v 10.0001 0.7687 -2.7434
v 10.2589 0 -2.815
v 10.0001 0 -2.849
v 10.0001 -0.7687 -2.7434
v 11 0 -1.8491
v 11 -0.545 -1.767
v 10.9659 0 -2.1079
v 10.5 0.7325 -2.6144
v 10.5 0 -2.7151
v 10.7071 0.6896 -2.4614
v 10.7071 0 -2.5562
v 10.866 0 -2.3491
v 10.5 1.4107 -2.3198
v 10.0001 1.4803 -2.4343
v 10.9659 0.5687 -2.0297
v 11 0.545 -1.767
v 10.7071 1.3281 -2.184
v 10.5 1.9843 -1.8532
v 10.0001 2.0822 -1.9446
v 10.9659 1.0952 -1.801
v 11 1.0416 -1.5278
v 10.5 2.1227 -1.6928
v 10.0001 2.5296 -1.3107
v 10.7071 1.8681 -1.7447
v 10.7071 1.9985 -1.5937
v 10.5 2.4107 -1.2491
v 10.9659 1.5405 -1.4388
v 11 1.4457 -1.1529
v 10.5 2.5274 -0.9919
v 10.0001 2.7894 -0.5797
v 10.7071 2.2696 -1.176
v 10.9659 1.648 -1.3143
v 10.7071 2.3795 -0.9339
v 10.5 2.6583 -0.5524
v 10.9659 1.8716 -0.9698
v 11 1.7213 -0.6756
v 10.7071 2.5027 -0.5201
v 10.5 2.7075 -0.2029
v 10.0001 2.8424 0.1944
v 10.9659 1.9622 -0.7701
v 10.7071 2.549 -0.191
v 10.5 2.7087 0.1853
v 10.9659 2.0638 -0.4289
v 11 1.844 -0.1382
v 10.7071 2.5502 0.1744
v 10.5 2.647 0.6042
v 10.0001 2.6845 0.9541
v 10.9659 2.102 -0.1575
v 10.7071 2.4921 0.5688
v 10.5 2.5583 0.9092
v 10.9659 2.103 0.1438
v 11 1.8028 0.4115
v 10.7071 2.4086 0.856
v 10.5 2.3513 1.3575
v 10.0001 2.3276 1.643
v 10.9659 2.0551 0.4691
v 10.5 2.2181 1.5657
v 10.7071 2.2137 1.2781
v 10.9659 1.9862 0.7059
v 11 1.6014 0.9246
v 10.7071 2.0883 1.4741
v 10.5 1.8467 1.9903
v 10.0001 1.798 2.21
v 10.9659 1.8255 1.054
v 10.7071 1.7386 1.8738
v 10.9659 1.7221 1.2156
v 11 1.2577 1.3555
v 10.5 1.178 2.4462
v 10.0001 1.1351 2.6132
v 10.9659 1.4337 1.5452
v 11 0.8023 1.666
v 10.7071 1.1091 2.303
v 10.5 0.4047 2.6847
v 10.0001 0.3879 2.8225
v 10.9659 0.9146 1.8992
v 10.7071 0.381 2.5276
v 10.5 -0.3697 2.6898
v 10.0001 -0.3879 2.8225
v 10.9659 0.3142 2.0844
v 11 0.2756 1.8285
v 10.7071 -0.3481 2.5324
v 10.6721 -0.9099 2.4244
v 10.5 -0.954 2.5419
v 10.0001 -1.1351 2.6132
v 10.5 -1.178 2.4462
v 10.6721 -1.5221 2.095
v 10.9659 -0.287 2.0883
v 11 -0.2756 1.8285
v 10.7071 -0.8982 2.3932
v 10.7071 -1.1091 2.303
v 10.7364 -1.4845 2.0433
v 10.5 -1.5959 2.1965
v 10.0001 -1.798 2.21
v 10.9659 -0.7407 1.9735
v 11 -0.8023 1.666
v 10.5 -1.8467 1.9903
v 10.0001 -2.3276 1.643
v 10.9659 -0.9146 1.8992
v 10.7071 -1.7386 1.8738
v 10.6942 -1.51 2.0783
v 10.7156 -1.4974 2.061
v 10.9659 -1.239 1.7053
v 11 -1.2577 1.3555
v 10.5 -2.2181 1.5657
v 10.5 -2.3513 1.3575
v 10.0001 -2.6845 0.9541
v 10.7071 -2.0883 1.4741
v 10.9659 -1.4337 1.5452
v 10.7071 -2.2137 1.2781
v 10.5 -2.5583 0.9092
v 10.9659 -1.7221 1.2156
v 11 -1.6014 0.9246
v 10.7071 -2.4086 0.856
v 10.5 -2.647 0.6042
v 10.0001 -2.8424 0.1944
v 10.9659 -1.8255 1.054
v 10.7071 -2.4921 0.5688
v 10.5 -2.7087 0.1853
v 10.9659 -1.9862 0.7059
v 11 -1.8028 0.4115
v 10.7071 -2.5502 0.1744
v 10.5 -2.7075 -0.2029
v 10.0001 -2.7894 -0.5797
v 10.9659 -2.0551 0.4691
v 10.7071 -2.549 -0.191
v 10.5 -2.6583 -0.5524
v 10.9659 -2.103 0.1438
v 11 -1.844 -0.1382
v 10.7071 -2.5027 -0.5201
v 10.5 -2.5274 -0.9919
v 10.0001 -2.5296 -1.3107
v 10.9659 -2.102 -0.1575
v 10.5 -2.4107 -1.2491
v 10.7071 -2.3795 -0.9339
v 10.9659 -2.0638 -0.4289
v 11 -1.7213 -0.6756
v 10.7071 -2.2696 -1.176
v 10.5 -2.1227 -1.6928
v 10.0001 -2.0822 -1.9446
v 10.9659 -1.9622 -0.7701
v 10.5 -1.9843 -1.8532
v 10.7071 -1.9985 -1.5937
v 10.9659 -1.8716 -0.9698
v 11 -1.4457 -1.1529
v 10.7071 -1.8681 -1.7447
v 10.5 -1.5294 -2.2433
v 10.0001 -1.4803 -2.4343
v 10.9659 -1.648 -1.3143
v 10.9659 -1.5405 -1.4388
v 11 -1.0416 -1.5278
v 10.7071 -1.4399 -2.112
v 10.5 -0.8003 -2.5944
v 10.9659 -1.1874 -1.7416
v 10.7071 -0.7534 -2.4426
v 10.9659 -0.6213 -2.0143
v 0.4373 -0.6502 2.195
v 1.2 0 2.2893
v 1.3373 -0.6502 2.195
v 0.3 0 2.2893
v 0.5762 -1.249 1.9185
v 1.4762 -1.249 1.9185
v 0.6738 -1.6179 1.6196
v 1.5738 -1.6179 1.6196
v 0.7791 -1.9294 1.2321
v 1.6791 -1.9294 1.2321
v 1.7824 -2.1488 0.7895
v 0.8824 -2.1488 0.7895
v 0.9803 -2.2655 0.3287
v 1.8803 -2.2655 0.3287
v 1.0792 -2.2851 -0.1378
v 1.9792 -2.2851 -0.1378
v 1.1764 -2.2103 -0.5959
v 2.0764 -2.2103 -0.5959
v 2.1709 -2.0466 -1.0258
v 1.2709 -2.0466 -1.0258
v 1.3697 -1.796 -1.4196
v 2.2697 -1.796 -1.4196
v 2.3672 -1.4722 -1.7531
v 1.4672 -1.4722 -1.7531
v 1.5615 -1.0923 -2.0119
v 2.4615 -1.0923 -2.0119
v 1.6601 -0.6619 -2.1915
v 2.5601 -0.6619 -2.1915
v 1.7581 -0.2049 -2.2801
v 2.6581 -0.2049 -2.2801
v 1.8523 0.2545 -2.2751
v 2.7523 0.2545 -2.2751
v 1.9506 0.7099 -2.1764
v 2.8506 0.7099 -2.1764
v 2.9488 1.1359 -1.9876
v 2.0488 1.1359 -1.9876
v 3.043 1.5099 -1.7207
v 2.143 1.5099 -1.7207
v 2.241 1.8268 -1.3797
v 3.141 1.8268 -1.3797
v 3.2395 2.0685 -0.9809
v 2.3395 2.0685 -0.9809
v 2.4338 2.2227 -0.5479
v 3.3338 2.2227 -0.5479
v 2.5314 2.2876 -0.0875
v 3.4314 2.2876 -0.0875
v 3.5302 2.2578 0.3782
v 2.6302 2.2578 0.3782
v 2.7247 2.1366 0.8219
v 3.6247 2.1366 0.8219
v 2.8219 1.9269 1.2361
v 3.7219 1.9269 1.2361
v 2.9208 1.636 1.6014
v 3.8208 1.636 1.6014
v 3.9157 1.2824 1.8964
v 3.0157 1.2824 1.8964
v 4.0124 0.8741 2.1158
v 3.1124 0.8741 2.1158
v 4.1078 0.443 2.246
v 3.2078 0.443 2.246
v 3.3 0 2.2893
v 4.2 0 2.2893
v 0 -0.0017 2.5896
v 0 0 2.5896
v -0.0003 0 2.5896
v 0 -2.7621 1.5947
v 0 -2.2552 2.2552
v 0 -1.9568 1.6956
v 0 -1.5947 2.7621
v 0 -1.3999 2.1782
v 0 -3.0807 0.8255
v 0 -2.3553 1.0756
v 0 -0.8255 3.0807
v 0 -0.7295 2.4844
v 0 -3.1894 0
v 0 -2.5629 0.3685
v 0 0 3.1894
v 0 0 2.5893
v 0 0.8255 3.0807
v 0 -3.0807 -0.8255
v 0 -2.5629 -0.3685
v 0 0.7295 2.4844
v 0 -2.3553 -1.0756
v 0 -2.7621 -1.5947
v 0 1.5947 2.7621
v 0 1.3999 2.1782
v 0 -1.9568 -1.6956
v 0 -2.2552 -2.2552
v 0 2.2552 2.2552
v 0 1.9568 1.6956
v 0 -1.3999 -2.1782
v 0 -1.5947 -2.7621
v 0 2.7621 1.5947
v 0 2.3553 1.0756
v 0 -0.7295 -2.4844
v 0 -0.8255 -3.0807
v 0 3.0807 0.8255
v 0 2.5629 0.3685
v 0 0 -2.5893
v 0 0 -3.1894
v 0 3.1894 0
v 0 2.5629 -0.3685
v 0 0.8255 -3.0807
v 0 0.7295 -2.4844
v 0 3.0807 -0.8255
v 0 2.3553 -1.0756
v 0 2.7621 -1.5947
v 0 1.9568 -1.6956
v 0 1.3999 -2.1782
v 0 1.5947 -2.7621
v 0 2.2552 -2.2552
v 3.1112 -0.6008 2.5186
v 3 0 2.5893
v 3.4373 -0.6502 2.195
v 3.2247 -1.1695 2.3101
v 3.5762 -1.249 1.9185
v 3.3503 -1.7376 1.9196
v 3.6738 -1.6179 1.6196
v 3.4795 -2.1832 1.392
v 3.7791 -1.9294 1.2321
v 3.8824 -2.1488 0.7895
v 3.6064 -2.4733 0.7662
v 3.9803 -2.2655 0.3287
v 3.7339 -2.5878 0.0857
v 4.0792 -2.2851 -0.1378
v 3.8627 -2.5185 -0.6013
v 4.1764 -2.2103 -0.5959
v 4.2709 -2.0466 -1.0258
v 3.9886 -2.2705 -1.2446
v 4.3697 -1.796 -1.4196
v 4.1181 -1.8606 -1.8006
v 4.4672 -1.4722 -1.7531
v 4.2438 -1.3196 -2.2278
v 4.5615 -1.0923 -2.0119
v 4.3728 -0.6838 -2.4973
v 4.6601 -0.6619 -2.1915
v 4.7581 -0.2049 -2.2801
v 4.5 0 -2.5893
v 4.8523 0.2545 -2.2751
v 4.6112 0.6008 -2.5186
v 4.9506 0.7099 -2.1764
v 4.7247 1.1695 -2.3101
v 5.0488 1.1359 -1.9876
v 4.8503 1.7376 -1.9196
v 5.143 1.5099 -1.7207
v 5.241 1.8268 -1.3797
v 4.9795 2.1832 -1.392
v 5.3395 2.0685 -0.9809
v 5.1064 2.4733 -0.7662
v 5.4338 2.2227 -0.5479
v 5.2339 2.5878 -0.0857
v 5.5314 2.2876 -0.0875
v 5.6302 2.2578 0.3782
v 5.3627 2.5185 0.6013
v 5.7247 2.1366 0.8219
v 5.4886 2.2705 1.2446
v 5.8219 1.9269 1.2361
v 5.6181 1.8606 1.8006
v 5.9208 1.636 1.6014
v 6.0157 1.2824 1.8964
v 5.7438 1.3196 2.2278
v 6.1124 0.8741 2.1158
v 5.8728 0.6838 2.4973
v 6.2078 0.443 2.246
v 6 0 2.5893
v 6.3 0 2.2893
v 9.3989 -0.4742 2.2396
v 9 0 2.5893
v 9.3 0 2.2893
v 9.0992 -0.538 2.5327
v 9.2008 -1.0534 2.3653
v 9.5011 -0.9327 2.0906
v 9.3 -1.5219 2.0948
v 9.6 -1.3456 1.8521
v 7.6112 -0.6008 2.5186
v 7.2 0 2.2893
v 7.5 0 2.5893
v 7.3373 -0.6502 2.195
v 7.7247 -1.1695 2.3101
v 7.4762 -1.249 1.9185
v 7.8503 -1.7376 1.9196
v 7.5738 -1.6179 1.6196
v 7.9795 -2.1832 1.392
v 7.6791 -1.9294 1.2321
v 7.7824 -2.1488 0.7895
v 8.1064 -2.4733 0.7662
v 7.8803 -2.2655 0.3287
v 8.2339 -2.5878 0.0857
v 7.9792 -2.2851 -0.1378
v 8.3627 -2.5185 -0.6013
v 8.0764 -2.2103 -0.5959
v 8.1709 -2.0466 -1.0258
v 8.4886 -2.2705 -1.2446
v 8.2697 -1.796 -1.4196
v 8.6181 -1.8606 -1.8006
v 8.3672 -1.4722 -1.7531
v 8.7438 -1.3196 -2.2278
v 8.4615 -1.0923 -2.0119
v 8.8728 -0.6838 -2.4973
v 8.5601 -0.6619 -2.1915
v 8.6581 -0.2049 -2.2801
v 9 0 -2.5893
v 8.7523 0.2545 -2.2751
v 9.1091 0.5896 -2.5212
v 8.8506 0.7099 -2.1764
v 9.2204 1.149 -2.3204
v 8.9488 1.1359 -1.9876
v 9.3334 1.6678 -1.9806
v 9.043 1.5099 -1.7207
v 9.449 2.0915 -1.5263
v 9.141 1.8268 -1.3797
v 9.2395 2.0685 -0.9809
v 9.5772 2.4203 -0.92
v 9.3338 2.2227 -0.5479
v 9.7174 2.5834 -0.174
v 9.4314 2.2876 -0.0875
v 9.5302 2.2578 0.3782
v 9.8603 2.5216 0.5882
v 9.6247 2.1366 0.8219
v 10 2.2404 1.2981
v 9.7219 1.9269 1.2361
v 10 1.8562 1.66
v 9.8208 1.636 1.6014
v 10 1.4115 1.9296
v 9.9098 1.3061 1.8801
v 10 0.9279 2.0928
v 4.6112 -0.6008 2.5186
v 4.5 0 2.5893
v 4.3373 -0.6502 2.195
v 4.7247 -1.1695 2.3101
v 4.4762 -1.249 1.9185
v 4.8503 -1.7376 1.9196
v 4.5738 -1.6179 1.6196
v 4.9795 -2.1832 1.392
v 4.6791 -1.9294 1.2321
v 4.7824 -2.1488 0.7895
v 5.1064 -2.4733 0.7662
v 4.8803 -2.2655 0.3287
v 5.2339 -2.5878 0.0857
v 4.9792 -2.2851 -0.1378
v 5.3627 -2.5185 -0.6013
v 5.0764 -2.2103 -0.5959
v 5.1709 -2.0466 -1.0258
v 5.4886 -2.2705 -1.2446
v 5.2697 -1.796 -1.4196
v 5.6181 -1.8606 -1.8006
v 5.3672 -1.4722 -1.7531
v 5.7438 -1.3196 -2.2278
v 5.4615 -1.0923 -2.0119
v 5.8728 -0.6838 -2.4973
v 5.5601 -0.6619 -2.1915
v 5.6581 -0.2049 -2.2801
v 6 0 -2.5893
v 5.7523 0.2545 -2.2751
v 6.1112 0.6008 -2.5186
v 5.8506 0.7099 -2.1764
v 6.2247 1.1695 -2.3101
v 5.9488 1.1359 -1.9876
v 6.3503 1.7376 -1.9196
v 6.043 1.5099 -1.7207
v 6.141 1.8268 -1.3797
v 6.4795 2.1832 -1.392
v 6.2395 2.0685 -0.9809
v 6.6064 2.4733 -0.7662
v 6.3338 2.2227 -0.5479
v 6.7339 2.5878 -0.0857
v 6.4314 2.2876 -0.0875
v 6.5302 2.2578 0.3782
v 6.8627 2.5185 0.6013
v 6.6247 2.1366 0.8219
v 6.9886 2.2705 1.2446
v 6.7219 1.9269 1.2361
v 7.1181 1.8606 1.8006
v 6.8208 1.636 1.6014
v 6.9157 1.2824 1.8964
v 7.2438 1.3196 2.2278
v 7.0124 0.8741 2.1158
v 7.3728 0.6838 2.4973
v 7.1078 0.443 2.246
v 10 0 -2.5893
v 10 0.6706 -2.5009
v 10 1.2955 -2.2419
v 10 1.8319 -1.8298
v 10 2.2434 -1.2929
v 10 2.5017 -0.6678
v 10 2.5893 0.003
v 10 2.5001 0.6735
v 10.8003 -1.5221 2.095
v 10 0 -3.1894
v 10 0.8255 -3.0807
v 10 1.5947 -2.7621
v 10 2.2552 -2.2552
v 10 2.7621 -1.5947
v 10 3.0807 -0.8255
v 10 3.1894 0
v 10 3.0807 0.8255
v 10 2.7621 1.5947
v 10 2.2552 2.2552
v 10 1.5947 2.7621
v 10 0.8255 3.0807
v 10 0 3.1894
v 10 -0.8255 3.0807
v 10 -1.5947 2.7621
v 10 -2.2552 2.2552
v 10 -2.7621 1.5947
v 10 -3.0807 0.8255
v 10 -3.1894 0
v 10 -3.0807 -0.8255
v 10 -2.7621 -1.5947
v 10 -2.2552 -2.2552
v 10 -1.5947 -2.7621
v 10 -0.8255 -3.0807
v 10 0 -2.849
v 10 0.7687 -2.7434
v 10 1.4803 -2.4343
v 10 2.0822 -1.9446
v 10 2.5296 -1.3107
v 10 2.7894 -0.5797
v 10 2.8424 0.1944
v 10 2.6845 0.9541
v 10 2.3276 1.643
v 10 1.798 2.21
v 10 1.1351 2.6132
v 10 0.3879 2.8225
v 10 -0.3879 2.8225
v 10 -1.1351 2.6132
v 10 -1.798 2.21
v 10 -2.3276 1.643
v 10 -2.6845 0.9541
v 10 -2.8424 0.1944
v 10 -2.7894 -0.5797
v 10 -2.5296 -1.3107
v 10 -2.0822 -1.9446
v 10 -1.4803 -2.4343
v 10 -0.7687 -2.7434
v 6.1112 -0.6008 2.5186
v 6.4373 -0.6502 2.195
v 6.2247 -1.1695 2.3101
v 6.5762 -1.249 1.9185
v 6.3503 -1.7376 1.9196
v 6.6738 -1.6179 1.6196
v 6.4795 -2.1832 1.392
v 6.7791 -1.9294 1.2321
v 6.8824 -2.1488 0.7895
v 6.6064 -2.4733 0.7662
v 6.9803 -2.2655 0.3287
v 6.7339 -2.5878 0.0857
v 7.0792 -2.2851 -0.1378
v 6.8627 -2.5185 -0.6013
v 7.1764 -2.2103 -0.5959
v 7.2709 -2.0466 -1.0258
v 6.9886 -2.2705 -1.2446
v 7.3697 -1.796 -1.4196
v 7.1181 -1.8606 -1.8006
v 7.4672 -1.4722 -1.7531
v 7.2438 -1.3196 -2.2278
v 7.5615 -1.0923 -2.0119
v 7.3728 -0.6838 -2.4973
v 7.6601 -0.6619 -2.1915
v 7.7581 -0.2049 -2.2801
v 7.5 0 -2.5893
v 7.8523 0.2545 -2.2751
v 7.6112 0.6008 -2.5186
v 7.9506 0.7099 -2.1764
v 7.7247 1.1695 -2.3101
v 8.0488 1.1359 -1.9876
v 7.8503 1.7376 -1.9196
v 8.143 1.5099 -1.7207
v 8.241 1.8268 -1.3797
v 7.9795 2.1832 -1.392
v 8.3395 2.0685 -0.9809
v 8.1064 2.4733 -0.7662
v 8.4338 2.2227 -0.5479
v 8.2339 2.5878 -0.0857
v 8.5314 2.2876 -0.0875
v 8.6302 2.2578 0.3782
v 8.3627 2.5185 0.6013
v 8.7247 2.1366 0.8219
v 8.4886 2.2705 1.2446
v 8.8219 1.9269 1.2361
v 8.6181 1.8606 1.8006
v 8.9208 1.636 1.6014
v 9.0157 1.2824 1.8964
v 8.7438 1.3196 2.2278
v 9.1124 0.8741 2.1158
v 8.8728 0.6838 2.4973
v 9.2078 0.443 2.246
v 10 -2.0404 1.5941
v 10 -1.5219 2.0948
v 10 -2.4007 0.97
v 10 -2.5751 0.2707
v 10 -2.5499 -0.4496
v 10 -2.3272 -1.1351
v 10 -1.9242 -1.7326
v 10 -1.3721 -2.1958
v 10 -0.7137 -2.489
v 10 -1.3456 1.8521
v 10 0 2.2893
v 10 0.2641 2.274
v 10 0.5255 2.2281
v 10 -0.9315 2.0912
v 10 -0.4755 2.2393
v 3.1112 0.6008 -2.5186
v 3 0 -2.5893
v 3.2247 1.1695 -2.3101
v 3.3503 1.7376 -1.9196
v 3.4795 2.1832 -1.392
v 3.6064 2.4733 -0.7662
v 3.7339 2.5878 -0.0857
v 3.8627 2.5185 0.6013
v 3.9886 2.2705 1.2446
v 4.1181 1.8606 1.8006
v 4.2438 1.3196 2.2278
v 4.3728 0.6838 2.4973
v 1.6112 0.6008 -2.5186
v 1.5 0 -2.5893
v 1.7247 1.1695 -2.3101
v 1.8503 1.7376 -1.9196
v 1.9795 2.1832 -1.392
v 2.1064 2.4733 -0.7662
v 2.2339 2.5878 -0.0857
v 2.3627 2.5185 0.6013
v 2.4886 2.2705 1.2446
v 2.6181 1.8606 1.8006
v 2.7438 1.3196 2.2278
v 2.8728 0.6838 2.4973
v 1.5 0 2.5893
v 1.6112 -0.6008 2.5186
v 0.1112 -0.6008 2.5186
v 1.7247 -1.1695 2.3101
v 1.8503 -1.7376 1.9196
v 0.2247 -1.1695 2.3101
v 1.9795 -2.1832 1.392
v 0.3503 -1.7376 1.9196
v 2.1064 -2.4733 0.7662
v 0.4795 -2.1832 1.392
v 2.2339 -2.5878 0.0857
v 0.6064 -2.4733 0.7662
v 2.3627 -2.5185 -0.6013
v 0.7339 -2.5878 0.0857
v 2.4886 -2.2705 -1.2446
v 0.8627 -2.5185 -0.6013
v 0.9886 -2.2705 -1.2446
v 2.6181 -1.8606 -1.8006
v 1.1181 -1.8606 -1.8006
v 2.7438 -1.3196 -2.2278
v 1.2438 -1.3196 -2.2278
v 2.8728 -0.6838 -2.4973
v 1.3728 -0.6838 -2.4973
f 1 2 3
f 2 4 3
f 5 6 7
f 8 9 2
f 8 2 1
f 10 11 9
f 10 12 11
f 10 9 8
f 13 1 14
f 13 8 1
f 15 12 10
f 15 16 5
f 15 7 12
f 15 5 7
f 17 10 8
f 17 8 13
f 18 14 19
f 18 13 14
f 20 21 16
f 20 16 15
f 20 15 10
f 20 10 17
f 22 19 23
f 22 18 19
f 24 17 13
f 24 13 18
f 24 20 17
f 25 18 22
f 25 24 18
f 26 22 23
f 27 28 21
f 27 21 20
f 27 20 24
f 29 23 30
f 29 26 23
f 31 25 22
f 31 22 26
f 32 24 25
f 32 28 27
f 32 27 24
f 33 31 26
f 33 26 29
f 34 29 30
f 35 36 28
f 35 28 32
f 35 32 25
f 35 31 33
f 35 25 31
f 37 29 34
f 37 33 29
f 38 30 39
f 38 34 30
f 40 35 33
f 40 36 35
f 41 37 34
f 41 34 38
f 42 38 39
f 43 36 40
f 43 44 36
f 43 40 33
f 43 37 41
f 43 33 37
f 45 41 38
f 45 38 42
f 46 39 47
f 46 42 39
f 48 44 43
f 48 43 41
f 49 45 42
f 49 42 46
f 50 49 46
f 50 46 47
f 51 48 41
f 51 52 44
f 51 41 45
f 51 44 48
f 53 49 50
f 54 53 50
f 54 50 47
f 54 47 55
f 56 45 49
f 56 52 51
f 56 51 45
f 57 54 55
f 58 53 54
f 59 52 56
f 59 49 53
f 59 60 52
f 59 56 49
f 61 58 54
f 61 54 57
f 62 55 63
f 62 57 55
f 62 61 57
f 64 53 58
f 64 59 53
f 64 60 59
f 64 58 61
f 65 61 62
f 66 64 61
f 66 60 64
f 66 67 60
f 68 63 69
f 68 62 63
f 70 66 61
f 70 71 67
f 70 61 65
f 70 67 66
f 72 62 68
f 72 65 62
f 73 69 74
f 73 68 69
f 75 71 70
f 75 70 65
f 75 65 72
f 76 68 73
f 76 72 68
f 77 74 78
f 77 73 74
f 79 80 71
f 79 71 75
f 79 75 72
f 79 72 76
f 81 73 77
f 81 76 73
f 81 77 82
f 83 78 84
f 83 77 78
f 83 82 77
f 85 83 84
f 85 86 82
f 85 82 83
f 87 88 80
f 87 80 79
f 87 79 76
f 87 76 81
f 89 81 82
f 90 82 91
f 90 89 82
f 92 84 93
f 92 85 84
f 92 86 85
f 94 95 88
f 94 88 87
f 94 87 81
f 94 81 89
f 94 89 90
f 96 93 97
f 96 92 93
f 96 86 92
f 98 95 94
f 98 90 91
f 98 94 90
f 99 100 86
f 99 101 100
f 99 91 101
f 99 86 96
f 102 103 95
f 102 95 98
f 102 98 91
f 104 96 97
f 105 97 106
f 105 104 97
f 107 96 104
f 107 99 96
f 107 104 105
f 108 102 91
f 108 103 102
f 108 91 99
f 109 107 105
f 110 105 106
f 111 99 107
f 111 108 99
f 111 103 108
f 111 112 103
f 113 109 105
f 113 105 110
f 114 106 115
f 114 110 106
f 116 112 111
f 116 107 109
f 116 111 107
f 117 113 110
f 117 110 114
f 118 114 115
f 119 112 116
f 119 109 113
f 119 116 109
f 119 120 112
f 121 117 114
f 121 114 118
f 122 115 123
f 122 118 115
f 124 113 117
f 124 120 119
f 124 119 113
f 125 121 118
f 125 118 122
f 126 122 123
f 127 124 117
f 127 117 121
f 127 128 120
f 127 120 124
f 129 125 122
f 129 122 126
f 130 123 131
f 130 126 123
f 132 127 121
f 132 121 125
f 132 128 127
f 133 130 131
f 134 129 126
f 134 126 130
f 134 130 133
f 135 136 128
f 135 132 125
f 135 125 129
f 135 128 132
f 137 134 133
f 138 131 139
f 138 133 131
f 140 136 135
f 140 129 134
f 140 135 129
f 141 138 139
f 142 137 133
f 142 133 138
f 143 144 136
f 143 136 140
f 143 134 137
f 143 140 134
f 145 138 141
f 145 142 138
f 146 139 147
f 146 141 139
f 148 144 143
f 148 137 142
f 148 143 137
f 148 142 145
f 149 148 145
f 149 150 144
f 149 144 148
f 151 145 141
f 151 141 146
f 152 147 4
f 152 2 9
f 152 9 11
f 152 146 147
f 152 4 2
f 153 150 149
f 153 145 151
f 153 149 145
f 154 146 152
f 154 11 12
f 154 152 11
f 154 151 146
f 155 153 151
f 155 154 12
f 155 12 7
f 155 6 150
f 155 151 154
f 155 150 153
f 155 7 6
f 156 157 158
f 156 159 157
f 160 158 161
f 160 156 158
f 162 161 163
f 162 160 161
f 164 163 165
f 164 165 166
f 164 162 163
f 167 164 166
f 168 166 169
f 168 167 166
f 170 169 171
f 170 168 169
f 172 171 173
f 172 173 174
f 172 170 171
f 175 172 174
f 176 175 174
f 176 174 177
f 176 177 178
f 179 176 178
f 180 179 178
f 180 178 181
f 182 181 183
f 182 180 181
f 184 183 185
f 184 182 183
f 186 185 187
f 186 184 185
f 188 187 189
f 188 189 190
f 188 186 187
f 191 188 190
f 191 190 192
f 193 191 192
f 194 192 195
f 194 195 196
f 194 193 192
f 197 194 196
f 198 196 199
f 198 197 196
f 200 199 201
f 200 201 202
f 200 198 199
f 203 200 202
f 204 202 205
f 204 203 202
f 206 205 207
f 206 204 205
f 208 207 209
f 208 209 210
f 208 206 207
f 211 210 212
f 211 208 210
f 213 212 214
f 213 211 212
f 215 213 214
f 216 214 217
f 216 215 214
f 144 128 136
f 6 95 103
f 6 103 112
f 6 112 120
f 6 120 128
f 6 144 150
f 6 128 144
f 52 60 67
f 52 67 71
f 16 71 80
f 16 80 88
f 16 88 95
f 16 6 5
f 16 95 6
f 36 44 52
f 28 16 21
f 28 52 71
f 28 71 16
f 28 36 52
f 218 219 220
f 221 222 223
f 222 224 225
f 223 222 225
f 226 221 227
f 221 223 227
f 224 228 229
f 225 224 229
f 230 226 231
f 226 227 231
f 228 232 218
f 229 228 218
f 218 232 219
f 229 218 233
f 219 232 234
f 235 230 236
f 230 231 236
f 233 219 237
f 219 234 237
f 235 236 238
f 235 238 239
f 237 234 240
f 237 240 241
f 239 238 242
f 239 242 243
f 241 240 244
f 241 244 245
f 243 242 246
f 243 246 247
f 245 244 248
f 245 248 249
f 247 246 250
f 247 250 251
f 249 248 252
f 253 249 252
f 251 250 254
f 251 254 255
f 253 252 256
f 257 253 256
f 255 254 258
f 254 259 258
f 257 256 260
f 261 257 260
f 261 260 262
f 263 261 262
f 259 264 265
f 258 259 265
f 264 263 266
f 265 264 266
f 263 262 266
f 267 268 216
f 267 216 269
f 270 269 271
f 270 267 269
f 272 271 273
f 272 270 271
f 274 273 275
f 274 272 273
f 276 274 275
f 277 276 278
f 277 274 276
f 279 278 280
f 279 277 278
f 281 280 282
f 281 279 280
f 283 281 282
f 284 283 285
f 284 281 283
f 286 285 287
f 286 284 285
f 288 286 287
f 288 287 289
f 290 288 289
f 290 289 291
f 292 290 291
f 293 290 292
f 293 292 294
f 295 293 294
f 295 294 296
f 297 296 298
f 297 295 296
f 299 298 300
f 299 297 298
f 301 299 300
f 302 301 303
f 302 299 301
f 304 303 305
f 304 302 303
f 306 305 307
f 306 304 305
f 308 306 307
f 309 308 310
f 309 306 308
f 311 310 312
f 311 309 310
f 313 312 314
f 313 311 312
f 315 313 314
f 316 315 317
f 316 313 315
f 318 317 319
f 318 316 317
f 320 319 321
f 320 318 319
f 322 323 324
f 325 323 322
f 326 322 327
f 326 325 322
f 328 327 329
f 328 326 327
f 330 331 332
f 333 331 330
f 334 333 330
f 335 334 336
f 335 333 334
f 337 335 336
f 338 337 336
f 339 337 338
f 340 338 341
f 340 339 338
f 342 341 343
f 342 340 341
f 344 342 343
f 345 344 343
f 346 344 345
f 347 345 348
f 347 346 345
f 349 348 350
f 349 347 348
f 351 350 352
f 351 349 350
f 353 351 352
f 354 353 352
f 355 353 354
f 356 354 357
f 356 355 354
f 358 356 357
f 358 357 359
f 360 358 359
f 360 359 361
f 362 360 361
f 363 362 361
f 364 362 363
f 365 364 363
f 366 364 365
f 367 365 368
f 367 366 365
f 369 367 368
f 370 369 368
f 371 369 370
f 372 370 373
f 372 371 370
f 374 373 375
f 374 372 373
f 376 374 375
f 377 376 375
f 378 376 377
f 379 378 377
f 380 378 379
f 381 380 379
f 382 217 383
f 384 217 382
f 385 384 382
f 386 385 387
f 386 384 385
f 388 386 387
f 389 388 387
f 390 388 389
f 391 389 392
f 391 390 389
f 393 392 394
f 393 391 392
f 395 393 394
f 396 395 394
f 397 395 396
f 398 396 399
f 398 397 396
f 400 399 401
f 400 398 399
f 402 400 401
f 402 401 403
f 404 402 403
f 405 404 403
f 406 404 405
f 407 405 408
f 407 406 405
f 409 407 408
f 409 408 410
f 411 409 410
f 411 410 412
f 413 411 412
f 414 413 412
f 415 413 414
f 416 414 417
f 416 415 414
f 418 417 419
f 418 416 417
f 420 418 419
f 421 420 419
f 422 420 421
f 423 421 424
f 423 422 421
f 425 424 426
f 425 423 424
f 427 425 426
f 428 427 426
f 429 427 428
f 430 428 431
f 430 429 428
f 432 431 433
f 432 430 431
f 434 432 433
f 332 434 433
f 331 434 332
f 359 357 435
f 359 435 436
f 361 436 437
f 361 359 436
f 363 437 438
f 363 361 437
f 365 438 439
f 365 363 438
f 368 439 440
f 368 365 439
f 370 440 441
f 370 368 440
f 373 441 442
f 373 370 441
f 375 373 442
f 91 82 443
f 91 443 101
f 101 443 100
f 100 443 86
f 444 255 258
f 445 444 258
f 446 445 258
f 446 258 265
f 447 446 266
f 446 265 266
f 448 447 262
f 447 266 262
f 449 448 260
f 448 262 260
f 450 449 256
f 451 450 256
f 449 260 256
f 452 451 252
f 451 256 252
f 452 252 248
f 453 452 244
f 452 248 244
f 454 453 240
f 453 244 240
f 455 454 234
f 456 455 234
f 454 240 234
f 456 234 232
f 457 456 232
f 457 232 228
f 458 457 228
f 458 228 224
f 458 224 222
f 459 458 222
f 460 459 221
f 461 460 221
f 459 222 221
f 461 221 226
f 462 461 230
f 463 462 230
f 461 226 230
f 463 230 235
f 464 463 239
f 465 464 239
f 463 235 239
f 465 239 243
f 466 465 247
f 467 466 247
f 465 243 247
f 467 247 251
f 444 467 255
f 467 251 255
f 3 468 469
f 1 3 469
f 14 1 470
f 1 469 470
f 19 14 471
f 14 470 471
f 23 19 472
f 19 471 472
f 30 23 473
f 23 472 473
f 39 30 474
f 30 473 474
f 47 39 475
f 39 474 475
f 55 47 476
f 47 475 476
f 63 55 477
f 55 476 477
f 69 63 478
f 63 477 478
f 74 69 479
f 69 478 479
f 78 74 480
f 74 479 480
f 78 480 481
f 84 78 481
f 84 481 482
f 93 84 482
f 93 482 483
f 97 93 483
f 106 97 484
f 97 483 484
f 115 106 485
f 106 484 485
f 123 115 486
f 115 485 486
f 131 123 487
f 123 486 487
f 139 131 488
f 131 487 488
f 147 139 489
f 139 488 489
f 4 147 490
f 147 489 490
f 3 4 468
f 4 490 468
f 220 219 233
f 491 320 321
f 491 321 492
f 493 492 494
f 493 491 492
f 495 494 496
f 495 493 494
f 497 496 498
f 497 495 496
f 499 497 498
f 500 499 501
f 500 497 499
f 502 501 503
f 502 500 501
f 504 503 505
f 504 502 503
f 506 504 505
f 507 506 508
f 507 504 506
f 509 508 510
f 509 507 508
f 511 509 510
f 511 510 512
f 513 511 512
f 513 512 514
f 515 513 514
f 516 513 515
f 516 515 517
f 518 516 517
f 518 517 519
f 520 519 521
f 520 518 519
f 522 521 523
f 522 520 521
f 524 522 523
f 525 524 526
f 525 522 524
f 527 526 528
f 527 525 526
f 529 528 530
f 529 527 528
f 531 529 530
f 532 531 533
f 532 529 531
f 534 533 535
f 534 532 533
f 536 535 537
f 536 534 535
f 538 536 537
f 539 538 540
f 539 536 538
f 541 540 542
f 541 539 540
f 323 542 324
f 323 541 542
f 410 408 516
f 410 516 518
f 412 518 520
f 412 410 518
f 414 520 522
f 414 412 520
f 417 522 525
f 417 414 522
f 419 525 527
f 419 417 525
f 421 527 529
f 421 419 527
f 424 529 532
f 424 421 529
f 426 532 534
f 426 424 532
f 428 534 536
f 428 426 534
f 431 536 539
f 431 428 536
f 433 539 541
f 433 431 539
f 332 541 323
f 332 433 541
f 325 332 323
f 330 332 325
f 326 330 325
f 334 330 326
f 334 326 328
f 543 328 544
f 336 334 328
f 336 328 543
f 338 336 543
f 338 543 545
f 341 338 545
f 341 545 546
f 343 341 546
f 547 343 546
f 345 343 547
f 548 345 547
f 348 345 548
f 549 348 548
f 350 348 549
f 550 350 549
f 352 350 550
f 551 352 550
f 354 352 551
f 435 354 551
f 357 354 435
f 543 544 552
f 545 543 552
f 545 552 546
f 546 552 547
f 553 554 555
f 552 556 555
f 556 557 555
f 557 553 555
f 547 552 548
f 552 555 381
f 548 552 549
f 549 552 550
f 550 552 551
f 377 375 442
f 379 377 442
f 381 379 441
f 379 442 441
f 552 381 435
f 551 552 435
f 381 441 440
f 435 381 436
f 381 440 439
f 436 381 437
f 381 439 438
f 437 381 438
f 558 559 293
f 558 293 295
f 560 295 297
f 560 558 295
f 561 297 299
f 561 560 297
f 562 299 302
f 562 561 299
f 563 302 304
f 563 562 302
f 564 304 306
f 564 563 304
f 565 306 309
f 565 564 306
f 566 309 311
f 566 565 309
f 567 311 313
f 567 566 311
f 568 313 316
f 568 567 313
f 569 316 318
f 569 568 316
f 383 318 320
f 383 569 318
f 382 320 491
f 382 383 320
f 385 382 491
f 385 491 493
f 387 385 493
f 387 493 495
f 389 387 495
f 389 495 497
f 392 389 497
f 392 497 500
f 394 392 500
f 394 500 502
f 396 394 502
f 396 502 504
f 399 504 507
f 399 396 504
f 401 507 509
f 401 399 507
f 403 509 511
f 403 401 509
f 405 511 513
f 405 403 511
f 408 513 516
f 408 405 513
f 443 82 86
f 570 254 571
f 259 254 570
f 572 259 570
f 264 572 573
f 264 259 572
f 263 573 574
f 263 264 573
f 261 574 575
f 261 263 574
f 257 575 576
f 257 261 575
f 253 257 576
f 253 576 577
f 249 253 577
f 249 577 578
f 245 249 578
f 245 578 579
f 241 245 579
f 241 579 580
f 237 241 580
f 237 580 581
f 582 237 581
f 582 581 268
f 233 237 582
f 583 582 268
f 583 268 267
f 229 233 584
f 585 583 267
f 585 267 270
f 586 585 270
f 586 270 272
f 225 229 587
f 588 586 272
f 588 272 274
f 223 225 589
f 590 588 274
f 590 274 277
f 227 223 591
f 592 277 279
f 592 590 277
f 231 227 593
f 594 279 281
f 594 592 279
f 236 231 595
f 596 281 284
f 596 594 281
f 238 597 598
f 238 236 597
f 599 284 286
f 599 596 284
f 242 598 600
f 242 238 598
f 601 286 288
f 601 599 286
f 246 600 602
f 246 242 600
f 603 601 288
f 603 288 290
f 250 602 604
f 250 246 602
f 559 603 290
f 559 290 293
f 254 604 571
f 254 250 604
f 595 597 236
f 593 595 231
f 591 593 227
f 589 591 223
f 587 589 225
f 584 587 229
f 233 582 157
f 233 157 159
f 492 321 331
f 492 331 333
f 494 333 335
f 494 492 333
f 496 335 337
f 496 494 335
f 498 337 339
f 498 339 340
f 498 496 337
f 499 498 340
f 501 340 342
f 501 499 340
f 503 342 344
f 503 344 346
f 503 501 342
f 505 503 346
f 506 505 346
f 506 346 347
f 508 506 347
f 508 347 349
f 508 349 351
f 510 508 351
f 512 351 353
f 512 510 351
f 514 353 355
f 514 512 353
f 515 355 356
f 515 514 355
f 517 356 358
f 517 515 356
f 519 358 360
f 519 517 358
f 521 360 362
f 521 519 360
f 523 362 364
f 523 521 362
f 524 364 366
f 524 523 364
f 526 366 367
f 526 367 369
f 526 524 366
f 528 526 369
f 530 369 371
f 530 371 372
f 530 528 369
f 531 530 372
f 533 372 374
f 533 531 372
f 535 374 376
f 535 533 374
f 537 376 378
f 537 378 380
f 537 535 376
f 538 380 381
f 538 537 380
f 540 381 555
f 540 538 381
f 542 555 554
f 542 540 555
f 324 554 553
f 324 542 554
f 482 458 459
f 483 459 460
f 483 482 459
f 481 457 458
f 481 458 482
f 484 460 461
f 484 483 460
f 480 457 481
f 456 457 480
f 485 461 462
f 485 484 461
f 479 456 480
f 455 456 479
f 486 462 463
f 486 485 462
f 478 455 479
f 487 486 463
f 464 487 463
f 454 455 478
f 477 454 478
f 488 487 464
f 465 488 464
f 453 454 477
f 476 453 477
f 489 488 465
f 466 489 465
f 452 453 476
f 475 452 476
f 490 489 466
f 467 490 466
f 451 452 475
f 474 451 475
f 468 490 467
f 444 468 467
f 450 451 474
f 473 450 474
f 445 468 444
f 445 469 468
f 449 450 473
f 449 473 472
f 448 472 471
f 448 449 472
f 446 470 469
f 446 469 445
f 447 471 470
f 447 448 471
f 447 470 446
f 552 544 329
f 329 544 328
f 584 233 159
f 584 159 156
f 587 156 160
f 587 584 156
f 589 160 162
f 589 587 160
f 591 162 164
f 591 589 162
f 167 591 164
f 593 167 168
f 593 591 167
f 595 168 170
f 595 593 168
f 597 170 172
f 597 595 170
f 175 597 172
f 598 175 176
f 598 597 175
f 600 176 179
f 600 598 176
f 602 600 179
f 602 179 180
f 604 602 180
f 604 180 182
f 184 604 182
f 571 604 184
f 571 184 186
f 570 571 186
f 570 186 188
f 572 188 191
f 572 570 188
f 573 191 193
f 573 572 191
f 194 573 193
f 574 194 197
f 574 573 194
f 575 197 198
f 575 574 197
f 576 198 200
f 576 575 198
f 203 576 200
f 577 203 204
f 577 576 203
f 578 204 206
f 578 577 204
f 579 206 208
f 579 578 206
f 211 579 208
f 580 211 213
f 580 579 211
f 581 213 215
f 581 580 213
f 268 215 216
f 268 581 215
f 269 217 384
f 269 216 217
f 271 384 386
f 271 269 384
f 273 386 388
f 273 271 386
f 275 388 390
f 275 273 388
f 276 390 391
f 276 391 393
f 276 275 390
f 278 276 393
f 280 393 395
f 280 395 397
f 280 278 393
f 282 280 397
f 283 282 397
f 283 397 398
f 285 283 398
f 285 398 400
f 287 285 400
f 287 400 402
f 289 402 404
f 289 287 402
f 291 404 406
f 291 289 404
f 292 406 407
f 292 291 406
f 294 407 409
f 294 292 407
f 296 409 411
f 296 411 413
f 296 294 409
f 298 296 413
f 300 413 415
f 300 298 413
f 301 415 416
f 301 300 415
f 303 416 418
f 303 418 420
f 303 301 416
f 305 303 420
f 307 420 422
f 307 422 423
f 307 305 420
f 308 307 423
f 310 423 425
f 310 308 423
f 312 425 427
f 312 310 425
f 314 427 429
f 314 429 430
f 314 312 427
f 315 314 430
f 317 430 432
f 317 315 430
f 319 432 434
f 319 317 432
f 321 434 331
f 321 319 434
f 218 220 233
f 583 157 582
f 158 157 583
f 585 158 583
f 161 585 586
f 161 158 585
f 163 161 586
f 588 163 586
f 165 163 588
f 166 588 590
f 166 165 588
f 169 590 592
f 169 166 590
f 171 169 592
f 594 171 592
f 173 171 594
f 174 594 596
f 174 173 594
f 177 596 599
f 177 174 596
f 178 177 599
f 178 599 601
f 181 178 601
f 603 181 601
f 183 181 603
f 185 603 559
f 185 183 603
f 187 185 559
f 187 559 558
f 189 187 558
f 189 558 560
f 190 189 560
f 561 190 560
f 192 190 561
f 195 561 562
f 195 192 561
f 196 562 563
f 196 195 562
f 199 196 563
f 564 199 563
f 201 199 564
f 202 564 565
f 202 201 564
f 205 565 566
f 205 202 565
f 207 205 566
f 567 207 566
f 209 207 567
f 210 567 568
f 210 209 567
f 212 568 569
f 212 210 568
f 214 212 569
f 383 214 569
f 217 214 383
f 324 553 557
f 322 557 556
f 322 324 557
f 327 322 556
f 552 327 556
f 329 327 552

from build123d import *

# Parameters (mm, degrees)
SKETCH2_R           = 3.189369039
SKETCH2_R_2         = 2.589261351
BOSS_EXTRUDE1_DEPTH = 10
SKETCH3_R           = 2.849023425
BOSS_EXTRUDE2_DEPTH = 1
FILLET1_R           = 1
SWEEP1_PITCH        = 3


with BuildPart() as part:
    # Sketch2 → Boss-Extrude1 (new body)
    with BuildSketch(Plane(origin=(0, 0, 0), x_dir=(0, 0, -1), z_dir=(1, 0, 0))):
        Circle(SKETCH2_R)
        Circle(SKETCH2_R_2, mode=Mode.SUBTRACT)
    extrude(amount=BOSS_EXTRUDE1_DEPTH)

    # Sketch3 → Boss-Extrude2 (add)
    with BuildSketch(Plane(origin=(10, 0, 0), x_dir=(0, 0, -1), z_dir=(1, 0, 0))):
        Circle(SKETCH3_R)
    extrude(amount=BOSS_EXTRUDE2_DEPTH)

    # Fillet1
    fillet1_edges = [part.edges().sort_by_distance(p)[0] for p in [
        (11, 0, 2.849023425),
    ]]
    fillet(fillet1_edges, radius=FILLET1_R - 0.0001)  # a hair under: the kernel refuses the full size

    # Sweep1: the profile of Sketch7 profile screwed along a right-hand helix of 3.1 turns, 10 arcs to a turn; built about Z, then put on its axis
    sweep1_z = Axis((0, 0, 0), (0, 0, 1))
    sweep1_corners = [(2.589561351, 0, -0.0003), (2.589561351, 0, 1.5003), (2.289261351, 0, 1.2), (2.289261351, 0, 0.3)]
    with BuildLine(mode=Mode.PRIVATE) as sweep1_profile:
        Line(sweep1_corners[0], sweep1_corners[1])
        Line(sweep1_corners[1], sweep1_corners[2])
        Line(sweep1_corners[2], sweep1_corners[3])
        Line(sweep1_corners[3], sweep1_corners[0])
    sweep1_cap = Face(sweep1_profile.wire())
    sweep1_turn_angles = [0, 18, 36, 54, 72, 90, 108, 126, 144, 162, 180, 198, 216, 234, 252, 270, 288, 306, 324, 342, 360]
    sweep1_turn_weights = [1, 0.9510565162951535, 1, 0.9510565162951535, 1, 0.9510565162951535, 1, 0.9510565162951535, 1, 0.9510565162951535, 1, 0.9510565162951535, 1, 0.9510565162951535, 1, 0.9510565162951535, 1, 0.9510565162951535, 1, 0.9510565162951535, 1]
    sweep1_turn_rails = [Edge.make_bspline([Vector(p[0], p[1], 0).rotate(sweep1_z, sweep1_turn_angles[k]) / sweep1_turn_weights[k] + Vector(0, 0, p[2] + SWEEP1_PITCH * sweep1_turn_angles[k] / 360) for k in range(21)], [0, 0, 0, 1, 1, 2, 2, 3, 3, 4, 4, 5, 5, 6, 6, 7, 7, 8, 8, 9, 9, 10, 10, 10], 2, sweep1_turn_weights) for p in sweep1_corners]
    sweep1_turn_sides = [Face.make_surface_from_curves(sweep1_turn_rails[p[0]], sweep1_turn_rails[p[1]]) for p in [(0, 1), (1, 2), (2, 3), (3, 0)]]
    sweep1_last_angles = [1080, 1098, 1116]
    sweep1_last_weights = [1, 0.9510565162951499, 1]
    sweep1_last_rails = [Edge.make_bspline([Vector(p[0], p[1], 0).rotate(sweep1_z, sweep1_last_angles[k]) / sweep1_last_weights[k] + Vector(0, 0, p[2] + SWEEP1_PITCH * sweep1_last_angles[k] / 360) for k in range(3)], [0, 0, 0, 1, 1, 1], 2, sweep1_last_weights) for p in sweep1_corners]
    sweep1_last_sides = [Face.make_surface_from_curves(sweep1_last_rails[p[0]], sweep1_last_rails[p[1]]) for p in [(0, 1), (1, 2), (2, 3), (3, 0)]]
    sweep1 = Plane(origin=(0, 0, 0), x_dir=(0, 0, 1), z_dir=(1, 0, 0)) * Solid(Shell([*[p.moved(Location((0, 0, SWEEP1_PITCH * i))) for i in range(3) for p in sweep1_turn_sides], *sweep1_last_sides, sweep1_cap, sweep1_cap.rotate(sweep1_z, 1116).moved(Location((0, 0, SWEEP1_PITCH * 1116 / 360)))]))
    add(sweep1)


solid = part.part
